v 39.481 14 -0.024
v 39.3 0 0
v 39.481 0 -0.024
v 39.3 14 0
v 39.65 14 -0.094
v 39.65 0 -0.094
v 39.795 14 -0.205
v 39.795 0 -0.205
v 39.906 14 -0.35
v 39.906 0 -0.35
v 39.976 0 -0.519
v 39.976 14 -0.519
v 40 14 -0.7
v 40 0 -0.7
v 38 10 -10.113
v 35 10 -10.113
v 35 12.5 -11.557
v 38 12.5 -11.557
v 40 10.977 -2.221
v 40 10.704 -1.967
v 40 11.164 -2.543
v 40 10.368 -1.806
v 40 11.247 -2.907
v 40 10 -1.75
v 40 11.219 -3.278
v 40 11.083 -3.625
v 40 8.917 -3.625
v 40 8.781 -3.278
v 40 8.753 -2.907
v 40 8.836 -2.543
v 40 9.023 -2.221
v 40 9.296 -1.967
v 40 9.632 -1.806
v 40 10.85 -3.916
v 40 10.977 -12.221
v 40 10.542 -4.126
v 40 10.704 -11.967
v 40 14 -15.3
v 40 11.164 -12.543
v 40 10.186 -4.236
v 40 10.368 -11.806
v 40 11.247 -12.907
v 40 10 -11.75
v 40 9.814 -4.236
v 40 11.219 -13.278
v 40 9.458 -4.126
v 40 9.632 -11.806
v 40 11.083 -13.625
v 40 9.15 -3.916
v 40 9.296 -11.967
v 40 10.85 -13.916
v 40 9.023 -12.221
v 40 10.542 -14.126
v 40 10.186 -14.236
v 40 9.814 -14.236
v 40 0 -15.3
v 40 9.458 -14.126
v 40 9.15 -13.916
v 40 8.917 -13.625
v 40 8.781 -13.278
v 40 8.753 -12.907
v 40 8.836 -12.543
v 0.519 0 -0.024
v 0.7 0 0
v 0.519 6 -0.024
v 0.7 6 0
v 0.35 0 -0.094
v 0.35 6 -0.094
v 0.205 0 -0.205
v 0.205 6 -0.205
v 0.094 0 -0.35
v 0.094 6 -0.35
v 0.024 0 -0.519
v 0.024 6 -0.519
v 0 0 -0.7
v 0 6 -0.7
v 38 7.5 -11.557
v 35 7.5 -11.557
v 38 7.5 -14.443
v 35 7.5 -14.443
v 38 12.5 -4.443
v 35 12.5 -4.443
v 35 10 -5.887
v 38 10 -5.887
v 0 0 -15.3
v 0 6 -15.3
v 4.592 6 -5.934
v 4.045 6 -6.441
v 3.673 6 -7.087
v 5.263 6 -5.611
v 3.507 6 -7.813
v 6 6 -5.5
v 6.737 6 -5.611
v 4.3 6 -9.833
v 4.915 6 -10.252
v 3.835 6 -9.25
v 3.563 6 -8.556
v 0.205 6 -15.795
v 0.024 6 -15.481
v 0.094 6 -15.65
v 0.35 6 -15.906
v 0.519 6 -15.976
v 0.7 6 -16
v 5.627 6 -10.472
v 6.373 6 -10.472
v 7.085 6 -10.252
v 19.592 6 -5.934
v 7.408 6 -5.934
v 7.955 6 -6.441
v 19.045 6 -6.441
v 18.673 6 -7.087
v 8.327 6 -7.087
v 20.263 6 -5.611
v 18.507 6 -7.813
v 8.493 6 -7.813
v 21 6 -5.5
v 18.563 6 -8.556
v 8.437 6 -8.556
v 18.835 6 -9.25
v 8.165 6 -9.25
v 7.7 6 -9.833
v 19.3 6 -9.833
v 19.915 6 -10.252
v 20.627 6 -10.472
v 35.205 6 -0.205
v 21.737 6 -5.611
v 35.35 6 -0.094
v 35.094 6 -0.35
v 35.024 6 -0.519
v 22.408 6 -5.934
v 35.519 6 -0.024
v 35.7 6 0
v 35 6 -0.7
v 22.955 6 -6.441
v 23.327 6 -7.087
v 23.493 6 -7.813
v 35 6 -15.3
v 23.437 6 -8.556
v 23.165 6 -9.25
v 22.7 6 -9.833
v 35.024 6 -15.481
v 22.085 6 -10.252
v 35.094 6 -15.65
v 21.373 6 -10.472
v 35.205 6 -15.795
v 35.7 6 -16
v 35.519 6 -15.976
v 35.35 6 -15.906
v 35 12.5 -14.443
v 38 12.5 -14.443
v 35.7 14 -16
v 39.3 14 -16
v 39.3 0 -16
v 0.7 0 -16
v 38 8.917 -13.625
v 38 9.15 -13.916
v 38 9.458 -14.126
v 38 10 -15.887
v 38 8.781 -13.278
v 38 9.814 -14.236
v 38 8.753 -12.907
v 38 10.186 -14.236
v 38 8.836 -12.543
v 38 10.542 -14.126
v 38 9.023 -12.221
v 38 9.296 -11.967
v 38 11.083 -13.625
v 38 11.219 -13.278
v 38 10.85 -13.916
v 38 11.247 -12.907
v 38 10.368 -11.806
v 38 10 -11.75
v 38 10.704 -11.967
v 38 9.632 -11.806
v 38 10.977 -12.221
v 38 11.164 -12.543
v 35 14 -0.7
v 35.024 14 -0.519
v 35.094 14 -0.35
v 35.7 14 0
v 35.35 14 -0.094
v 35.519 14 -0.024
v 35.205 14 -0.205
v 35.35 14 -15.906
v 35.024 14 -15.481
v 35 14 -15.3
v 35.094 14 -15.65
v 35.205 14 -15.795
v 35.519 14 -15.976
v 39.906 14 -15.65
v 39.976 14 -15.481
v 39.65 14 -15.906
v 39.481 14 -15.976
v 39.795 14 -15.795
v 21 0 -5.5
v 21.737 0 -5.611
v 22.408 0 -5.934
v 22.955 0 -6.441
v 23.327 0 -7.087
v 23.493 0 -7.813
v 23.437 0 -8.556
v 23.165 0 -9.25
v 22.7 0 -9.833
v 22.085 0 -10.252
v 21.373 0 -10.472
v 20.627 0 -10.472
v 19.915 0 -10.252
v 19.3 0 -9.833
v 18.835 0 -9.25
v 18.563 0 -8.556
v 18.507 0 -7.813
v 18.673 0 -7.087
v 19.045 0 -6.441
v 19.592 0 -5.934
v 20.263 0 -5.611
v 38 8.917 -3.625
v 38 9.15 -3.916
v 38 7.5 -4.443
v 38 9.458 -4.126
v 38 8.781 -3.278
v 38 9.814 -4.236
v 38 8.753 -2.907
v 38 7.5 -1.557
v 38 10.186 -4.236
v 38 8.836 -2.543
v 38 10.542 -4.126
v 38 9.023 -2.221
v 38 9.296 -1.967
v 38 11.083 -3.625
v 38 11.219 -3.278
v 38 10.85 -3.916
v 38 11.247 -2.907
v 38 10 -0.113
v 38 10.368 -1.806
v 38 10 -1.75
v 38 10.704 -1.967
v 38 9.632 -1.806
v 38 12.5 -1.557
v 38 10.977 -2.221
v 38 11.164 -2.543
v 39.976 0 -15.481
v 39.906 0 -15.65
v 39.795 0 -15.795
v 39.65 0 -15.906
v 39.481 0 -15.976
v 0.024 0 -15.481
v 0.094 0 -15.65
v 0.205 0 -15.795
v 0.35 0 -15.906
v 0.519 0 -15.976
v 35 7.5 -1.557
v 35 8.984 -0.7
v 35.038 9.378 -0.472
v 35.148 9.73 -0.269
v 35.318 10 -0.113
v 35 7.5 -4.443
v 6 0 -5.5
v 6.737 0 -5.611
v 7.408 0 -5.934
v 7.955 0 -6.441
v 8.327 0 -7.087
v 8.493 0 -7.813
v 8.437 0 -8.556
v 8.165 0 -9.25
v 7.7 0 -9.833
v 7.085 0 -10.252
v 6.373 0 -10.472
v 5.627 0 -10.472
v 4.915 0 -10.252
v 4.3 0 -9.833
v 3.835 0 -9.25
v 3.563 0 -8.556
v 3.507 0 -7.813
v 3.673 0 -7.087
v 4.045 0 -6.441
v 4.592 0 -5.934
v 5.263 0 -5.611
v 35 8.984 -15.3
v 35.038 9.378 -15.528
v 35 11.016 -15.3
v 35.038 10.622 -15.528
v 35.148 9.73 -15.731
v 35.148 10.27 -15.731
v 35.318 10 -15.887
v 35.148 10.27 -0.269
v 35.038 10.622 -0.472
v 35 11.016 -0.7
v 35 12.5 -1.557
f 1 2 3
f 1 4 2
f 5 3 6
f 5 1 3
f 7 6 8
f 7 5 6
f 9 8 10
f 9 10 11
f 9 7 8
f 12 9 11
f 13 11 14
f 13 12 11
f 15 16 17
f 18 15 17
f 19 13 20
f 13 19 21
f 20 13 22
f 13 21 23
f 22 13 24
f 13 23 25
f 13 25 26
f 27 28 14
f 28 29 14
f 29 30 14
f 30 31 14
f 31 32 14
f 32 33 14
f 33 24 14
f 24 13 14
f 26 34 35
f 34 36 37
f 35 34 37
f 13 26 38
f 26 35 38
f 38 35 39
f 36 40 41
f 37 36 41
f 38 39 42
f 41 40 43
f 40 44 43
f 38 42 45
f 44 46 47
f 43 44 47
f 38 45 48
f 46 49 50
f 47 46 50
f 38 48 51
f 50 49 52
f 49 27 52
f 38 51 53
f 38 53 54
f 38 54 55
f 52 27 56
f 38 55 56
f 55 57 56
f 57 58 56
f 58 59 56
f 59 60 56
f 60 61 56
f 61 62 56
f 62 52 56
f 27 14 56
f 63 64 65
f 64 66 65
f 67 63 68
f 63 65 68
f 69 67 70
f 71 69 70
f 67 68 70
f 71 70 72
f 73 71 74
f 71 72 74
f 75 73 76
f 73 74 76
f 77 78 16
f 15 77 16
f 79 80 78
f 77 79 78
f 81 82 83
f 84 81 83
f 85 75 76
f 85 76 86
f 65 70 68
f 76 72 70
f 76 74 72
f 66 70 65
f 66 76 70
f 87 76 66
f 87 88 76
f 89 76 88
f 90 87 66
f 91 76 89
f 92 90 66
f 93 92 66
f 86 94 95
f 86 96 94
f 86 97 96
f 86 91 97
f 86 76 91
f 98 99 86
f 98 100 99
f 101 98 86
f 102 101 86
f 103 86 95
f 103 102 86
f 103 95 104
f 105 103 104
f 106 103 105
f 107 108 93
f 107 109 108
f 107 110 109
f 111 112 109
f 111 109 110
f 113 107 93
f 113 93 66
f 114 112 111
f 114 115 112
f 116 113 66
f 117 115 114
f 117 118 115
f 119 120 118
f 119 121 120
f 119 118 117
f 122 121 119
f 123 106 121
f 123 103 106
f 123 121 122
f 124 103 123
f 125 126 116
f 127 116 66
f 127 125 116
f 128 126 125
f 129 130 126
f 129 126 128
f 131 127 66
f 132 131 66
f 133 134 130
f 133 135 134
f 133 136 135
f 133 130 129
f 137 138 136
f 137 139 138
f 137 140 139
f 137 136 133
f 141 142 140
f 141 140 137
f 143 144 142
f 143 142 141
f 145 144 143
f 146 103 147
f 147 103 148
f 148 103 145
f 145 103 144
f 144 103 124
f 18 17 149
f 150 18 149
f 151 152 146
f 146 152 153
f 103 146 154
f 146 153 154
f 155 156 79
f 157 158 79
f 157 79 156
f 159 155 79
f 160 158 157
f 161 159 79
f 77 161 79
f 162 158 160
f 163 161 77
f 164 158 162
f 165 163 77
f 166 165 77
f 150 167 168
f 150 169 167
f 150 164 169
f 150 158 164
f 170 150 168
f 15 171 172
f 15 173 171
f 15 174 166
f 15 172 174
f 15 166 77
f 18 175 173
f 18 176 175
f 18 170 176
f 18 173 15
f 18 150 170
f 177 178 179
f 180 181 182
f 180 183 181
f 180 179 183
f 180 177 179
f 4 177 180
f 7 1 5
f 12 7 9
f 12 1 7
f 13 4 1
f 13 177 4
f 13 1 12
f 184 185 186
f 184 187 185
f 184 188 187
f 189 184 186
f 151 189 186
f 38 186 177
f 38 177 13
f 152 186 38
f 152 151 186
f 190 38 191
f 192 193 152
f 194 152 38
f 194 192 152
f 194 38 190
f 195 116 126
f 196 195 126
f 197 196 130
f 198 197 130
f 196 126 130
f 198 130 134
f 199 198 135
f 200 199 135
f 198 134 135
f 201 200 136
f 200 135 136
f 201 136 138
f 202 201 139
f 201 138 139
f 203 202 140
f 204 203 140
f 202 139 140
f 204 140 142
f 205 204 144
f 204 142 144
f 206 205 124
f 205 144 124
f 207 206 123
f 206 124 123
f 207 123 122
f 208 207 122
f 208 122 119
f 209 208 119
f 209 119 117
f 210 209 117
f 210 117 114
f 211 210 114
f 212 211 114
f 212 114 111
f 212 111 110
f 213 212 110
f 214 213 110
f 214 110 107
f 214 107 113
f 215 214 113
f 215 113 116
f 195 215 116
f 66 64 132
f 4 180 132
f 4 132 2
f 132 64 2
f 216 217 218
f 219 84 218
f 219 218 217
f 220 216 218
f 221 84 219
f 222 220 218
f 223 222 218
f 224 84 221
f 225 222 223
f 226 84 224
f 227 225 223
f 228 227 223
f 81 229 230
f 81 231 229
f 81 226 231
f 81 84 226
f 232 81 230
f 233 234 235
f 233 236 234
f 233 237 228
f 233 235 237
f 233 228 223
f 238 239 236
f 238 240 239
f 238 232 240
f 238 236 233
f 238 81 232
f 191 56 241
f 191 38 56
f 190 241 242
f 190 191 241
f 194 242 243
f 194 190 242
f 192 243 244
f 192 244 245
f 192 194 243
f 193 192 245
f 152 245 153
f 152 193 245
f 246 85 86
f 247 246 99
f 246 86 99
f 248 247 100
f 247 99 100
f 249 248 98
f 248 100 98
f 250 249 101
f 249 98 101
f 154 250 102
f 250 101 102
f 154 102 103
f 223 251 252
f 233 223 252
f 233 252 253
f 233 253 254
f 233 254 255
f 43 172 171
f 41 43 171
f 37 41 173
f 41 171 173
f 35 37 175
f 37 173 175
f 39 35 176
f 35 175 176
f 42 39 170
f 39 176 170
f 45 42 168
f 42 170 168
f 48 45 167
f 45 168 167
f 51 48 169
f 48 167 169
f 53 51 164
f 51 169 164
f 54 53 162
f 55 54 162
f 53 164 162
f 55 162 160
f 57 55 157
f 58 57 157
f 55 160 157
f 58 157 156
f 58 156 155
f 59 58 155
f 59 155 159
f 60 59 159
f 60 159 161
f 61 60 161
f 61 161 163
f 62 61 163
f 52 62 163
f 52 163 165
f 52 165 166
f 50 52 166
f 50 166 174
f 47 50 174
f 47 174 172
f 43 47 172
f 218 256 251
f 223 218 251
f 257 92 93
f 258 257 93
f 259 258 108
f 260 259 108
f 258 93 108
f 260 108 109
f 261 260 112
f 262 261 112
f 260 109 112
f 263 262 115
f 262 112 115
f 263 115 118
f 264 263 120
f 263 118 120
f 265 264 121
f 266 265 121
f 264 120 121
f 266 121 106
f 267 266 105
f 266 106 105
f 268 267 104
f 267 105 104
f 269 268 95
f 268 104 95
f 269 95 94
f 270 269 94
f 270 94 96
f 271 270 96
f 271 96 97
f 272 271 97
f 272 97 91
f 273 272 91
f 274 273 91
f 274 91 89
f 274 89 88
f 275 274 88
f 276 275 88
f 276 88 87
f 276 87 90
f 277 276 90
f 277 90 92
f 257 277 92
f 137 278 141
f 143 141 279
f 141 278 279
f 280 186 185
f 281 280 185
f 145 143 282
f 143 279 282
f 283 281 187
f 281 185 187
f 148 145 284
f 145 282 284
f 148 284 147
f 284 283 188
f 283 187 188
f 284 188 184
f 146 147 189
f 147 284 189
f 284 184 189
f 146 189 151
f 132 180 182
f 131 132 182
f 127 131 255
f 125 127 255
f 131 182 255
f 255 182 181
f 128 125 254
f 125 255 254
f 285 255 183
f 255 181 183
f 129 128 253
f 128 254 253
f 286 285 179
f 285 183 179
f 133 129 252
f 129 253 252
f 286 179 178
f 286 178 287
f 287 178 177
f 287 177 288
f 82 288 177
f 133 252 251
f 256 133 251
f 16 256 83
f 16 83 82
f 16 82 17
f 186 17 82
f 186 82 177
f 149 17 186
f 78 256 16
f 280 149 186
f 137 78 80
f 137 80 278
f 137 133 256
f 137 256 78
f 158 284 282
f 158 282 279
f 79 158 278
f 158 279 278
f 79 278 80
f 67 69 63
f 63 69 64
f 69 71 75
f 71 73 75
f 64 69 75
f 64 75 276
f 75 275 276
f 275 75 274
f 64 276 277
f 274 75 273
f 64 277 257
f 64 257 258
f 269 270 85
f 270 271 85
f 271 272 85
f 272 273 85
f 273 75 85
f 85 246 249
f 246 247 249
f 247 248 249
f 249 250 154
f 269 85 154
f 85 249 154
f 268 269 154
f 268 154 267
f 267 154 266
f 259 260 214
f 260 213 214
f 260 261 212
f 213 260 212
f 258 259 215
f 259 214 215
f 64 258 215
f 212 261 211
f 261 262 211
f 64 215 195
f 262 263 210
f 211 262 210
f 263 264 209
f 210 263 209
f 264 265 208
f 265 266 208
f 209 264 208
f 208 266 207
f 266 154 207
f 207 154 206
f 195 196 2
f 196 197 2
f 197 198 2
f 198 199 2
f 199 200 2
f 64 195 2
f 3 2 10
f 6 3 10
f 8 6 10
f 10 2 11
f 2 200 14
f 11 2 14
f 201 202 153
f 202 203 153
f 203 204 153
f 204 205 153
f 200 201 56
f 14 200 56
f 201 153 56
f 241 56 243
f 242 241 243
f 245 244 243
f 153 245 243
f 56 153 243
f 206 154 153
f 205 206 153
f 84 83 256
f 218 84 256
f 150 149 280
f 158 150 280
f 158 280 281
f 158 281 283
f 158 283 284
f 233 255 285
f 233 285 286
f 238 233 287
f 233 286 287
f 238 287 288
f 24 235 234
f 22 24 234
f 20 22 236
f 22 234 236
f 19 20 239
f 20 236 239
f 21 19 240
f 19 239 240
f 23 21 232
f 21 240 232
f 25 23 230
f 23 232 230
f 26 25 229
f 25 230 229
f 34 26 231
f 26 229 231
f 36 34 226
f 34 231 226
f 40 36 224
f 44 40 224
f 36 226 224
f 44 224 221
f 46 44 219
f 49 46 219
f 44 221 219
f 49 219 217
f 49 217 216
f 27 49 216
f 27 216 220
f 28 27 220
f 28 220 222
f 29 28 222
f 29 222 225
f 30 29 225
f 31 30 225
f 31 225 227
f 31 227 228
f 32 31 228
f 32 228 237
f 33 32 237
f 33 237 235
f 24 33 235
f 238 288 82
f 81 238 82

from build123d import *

# Parameters (mm, degrees)
SKETCH1_W           = 40
SKETCH1_H           = 16
BOSS_EXTRUDE1_DEPTH = 6
SKETCH1_4_W         = 5
SKETCH1_4_H         = 16
BOSS_EXTRUDE2_DEPTH = 14
SKETCH4_R           = 2.5
CUT_EXTRUDE1_DEPTH  = 14
SKETCH3_R           = 1.25
CUT_EXTRUDE2_DEPTH  = 14
FILLET1_R           = 0.7
CUT_EXTRUDE3_DEPTH  = 3


with BuildPart() as part:
    # Sketch1 → Boss-Extrude1 (new body)
    with BuildSketch(Plane(origin=(0, 0, 0), x_dir=(1, 0, 0), z_dir=(0, 1, 0))):
        with Locations((20, 8)):
            Rectangle(SKETCH1_W, SKETCH1_H)
    extrude(amount=BOSS_EXTRUDE1_DEPTH)

    # Sketch1<4> → Boss-Extrude2 (add)
    with BuildSketch(Plane(origin=(0, 0, 0), x_dir=(1, 0, 0), z_dir=(0, 1, 0))):
        with Locations((37.5, 8)):
            Rectangle(SKETCH1_4_W, SKETCH1_4_H)
    extrude(amount=BOSS_EXTRUDE2_DEPTH)

    # Sketch4 → Cut-Extrude1 (cut)
    with BuildSketch(Plane(origin=(0, 6, 0), x_dir=(1, 0, 0), z_dir=(0, 1, 0))):
        with Locations((6, 8)):
            Circle(SKETCH4_R)
        with Locations((21, 8)):
            Circle(SKETCH4_R)
    extrude(amount=-CUT_EXTRUDE1_DEPTH, mode=Mode.SUBTRACT)

    # Sketch3 → Cut-Extrude2 (cut)
    with BuildSketch(Plane.ZY.offset(-35)):
        with Locations((-13, 10)):
            Circle(SKETCH3_R)
        with Locations((-3, 10)):
            Circle(SKETCH3_R)
    extrude(amount=-CUT_EXTRUDE2_DEPTH, mode=Mode.SUBTRACT)

    # Fillet1
    fillet1_edges = [part.edges().sort_by_distance(p)[0] for p in [
        (0, 3, -16),
        (0, 3, 0),
        (35, 10, -16),
        (40, 7, -16),
        (35, 10, 0),
        (40, 7, 0),
    ]]
    fillet(fillet1_edges, radius=FILLET1_R)

    # Sketch5 → Cut-Extrude3 (cut)
    with BuildSketch(Plane.ZY.offset(-35)):
        Polygon((-11.556624327, 12.5), (-14.443375673, 12.5), (-15.886751346, 10), (-14.443375673, 7.5), (-11.556624327, 7.5), (-10.113248654, 10), align=None)
        Polygon((-4.443375673, 12.5), (-5.886751346, 10), (-4.443375673, 7.5), (-1.556624327, 7.5), (-0.113248654, 10), (-1.556624327, 12.5), align=None)
    extrude(amount=-CUT_EXTRUDE3_DEPTH, mode=Mode.SUBTRACT)


solid = part.part
